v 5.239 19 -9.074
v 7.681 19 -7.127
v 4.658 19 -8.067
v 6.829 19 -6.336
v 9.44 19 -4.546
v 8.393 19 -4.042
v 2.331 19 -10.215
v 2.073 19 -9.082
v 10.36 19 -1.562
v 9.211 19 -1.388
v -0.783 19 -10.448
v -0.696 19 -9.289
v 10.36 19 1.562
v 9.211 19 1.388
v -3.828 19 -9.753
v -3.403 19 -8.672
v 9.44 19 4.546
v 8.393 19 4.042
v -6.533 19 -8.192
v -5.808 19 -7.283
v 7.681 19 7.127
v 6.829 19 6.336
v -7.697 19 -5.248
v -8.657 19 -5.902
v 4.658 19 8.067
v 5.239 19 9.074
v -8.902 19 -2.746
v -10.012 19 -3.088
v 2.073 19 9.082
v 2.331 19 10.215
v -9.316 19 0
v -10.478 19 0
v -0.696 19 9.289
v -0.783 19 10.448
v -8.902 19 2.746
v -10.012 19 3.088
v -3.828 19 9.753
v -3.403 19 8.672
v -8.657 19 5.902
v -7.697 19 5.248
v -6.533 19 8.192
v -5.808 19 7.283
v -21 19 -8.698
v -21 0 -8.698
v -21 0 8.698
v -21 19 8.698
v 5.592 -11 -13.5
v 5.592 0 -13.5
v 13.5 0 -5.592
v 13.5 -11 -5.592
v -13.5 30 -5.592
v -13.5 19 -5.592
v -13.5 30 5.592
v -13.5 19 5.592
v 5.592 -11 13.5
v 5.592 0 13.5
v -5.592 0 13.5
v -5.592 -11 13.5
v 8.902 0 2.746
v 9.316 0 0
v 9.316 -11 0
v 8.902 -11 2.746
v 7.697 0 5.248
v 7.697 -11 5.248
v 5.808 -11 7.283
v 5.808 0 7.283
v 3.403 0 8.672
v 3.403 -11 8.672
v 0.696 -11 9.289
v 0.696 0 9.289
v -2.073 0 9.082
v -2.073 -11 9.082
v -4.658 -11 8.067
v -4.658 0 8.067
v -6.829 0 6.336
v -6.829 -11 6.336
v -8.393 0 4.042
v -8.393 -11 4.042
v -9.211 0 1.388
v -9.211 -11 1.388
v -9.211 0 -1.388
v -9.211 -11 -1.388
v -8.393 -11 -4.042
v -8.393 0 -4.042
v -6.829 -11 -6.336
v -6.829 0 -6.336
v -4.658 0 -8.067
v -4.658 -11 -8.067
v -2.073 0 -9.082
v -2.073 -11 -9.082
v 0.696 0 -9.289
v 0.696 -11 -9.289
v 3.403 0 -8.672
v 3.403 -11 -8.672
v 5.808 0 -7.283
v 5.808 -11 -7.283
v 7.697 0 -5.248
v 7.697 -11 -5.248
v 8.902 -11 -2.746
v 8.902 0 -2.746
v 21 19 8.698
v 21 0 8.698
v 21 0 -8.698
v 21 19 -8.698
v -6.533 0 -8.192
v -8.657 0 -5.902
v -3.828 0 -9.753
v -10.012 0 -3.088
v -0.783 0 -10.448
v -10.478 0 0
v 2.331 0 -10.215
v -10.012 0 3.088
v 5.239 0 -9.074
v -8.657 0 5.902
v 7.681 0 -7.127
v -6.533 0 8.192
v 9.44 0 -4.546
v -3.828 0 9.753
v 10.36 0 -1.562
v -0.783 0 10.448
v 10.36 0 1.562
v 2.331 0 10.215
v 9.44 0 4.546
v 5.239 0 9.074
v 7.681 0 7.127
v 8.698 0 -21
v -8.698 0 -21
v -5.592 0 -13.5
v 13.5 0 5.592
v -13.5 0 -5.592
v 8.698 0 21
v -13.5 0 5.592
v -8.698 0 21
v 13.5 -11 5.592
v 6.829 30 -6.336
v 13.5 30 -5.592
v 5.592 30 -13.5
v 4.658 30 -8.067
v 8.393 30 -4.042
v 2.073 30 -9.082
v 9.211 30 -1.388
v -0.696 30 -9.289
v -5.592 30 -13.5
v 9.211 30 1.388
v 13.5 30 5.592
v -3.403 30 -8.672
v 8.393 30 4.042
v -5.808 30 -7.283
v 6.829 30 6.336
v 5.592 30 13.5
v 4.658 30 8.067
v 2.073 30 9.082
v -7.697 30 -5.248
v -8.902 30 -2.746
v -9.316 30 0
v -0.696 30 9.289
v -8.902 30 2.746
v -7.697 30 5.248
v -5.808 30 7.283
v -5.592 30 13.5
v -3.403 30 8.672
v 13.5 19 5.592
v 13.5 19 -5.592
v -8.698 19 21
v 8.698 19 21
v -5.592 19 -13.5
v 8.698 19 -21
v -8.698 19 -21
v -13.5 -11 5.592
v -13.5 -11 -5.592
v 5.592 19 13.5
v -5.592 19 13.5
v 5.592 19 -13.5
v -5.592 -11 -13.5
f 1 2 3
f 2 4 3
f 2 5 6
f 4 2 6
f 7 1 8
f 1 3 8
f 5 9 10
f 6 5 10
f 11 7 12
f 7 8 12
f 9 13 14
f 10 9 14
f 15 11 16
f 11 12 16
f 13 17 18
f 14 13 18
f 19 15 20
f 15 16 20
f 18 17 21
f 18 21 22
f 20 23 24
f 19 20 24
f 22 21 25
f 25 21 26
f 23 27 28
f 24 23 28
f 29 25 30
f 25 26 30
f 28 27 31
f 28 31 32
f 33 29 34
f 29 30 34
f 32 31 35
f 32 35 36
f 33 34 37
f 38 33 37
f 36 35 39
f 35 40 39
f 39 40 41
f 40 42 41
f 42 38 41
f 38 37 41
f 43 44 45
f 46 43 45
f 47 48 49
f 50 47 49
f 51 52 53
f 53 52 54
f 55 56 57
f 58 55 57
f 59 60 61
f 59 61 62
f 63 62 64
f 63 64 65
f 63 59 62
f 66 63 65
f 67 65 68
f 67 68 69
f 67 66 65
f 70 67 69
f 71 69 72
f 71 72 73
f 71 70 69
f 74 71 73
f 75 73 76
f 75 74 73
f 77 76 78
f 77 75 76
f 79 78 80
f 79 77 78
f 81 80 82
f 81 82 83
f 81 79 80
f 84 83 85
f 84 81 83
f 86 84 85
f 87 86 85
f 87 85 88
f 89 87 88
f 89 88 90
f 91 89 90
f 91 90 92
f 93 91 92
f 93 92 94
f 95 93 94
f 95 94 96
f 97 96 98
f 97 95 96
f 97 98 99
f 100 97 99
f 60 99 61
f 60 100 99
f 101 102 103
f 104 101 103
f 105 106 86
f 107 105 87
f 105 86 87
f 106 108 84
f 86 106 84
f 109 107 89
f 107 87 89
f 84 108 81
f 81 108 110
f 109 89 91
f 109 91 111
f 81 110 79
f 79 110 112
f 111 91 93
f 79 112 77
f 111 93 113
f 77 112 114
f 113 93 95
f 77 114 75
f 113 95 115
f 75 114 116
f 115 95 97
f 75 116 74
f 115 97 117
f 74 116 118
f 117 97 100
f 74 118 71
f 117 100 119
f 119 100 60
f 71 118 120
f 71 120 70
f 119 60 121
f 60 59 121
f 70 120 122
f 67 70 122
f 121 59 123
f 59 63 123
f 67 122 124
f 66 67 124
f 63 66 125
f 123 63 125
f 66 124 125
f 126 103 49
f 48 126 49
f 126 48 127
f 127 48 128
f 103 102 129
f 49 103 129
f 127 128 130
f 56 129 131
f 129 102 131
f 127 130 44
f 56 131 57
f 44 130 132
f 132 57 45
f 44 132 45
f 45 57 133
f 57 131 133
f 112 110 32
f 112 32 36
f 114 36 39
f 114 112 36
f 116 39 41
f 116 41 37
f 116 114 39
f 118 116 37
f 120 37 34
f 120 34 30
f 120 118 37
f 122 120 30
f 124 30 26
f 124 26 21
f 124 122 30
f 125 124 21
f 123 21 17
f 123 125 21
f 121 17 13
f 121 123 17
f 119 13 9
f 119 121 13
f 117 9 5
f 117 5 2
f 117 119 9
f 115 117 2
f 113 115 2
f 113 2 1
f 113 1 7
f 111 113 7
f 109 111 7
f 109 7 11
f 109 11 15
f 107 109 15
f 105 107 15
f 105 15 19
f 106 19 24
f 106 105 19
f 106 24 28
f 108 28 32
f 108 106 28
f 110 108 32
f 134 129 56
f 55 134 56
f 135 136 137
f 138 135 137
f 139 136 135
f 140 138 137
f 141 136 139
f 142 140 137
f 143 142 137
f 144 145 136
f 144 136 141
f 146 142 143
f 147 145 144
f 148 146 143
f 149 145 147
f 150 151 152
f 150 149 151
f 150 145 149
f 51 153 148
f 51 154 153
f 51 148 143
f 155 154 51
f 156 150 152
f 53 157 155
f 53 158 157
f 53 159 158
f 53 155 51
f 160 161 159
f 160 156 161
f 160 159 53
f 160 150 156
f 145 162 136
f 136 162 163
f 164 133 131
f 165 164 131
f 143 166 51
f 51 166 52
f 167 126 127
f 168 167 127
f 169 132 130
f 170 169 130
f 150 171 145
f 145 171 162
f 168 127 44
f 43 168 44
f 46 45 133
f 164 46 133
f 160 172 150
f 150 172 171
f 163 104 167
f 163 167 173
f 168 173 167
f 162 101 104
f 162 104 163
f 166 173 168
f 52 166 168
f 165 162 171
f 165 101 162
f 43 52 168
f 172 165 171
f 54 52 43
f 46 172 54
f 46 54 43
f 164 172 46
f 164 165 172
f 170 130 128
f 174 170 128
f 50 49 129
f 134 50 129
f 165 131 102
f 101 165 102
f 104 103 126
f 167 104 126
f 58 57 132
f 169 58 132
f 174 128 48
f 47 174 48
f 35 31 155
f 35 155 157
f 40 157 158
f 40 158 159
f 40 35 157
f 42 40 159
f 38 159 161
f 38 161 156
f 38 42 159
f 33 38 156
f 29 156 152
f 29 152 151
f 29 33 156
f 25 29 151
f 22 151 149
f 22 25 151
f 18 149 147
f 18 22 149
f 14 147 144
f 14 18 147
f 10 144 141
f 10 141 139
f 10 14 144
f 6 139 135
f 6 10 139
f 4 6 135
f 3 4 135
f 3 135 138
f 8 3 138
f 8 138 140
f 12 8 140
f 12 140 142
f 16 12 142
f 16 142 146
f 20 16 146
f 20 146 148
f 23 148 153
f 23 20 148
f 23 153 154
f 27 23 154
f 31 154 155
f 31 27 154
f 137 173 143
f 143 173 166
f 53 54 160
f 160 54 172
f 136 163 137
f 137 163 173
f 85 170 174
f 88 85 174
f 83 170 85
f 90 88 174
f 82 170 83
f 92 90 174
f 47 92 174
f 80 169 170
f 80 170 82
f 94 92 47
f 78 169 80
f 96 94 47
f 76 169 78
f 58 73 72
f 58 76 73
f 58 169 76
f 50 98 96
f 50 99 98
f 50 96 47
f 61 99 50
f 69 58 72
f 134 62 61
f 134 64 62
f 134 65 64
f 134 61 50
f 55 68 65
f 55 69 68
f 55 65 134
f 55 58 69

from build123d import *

# Parameters (mm, degrees)
F0_R     = 9.3155
F1_DEPTH = 11
F2_R     = 10.4775
F3_DEPTH = 19
F4_R     = 9.3155
F5_DEPTH = 11


with BuildPart() as f1:
    # F0 (on Front) → F1 (new body)
    with BuildSketch(Plane.XZ):
        Polygon((13.5, -5.591883), (13.5, 5.591883), (5.591883, 13.5), (-5.591883, 13.5), (-13.5, 5.591883), (-13.5, -5.591883), (-5.591883, -13.5), (5.591883, -13.5), align=None)
        Circle(F0_R, mode=Mode.SUBTRACT)
    extrude(amount=F1_DEPTH)

    # F2 (on face) → F3 (join)
    with BuildSketch(Plane(origin=(0, 0, 0), x_dir=(-1, 0, 0), z_dir=(0, 1, 0))):
        Polygon((21, -8.698485), (21, 8.698485), (8.698485, 21), (-8.698485, 21), (-21, 8.698485), (-21, -8.698485), (-8.698485, -21), (8.698485, -21), align=None)
        Circle(F2_R, mode=Mode.SUBTRACT)
    extrude(amount=F3_DEPTH)

    # F4 (on face) → F5 (join)
    with BuildSketch(Plane(origin=(0, 19, 0), x_dir=(-1, 0, 0), z_dir=(0, 1, 0))):
        Polygon((13.5, -5.591883), (13.5, 5.591883), (5.591883, 13.5), (-5.591883, 13.5), (-13.5, 5.591883), (-13.5, -5.591883), (-5.591883, -13.5), (5.591883, -13.5), align=None)
        Circle(F4_R, mode=Mode.SUBTRACT)
    extrude(amount=F5_DEPTH)


solid = f1.part
